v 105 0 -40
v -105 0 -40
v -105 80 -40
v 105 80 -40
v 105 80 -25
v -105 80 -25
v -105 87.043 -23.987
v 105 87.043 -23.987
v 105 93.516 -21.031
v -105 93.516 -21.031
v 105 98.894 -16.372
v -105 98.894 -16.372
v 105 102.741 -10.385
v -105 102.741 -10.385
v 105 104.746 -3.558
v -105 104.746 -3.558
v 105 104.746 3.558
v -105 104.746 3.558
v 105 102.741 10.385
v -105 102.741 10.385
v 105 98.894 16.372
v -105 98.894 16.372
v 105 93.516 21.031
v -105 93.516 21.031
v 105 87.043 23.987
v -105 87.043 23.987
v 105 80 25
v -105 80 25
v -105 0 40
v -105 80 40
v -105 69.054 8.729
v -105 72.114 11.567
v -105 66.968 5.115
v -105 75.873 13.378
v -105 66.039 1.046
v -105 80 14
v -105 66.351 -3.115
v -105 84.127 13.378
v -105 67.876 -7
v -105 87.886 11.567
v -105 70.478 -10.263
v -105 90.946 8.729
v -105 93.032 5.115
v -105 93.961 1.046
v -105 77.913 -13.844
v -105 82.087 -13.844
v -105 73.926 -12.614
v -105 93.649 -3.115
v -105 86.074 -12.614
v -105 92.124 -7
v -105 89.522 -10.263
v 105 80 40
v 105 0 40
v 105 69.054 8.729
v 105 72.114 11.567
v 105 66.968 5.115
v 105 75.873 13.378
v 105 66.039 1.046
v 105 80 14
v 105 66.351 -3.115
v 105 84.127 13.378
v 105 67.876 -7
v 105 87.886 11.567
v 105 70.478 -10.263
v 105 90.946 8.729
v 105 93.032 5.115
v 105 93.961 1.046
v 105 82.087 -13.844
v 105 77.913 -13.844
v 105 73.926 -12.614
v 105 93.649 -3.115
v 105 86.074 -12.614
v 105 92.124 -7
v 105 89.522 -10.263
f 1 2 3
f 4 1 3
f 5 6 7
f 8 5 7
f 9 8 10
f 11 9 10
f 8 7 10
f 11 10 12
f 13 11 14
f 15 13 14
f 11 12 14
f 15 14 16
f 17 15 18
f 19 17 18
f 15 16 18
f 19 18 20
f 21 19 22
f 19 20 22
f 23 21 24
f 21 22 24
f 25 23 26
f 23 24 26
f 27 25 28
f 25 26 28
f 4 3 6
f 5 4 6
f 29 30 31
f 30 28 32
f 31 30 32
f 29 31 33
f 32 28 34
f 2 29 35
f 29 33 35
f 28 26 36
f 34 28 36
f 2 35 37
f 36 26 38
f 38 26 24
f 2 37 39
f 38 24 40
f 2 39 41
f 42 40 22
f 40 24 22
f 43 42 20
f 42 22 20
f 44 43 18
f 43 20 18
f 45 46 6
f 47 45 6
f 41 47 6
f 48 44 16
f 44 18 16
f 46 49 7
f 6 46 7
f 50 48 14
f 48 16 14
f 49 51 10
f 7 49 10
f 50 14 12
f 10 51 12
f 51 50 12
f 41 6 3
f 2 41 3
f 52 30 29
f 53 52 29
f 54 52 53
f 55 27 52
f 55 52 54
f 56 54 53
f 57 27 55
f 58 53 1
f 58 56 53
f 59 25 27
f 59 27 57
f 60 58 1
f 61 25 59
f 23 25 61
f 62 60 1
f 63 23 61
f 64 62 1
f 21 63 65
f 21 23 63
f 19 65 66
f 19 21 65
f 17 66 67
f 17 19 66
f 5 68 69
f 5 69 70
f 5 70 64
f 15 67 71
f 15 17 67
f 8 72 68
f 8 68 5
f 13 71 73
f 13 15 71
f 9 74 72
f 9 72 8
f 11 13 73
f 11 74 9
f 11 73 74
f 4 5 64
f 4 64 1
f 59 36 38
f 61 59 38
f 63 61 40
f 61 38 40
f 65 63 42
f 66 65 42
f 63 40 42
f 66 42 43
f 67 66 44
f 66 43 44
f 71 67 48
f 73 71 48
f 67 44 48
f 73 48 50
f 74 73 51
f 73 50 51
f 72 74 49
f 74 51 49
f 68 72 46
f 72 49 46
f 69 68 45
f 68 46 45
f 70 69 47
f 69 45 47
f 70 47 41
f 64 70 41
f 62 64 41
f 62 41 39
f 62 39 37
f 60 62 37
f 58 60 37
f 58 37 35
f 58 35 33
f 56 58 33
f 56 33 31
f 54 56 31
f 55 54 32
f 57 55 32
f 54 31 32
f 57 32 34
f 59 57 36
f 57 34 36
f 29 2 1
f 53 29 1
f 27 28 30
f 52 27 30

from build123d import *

# Parameters (mm, degrees)
SKETCH_1_W      = 210
SKETCH_1_H      = 80
EXTRUDE_1_DEPTH = 50
SKETCH_2_R      = 14
EXTRUDE_2_DEPTH = 210


with BuildPart() as part:
    # 草图1 → 凸台-拉伸1 (new body)
    with BuildSketch(Plane(origin=(0, 0, 0), x_dir=(1, 0, 0), z_dir=(0, 1, 0))):
        Rectangle(SKETCH_1_W, SKETCH_1_H)
    extrude(amount=EXTRUDE_1_DEPTH)

    # 草图2 → 凸台-拉伸2 (add)
    with BuildSketch(Plane.ZY.offset(105)):
        with BuildLine():
            Line((25, 80), (40, 80))
            Line((40, 80), (40, 50))
            Line((40, 50), (-40, 50))
            Line((-40, 50), (-40, 80))
            Line((-40, 80), (-25, 80))
            ThreePointArc((-25, 80), (0, 105), (25, 80))
        make_face()
        with Locations((0, 80)):
            Circle(SKETCH_2_R, mode=Mode.SUBTRACT)
    extrude(amount=-EXTRUDE_2_DEPTH)


solid = part.part
